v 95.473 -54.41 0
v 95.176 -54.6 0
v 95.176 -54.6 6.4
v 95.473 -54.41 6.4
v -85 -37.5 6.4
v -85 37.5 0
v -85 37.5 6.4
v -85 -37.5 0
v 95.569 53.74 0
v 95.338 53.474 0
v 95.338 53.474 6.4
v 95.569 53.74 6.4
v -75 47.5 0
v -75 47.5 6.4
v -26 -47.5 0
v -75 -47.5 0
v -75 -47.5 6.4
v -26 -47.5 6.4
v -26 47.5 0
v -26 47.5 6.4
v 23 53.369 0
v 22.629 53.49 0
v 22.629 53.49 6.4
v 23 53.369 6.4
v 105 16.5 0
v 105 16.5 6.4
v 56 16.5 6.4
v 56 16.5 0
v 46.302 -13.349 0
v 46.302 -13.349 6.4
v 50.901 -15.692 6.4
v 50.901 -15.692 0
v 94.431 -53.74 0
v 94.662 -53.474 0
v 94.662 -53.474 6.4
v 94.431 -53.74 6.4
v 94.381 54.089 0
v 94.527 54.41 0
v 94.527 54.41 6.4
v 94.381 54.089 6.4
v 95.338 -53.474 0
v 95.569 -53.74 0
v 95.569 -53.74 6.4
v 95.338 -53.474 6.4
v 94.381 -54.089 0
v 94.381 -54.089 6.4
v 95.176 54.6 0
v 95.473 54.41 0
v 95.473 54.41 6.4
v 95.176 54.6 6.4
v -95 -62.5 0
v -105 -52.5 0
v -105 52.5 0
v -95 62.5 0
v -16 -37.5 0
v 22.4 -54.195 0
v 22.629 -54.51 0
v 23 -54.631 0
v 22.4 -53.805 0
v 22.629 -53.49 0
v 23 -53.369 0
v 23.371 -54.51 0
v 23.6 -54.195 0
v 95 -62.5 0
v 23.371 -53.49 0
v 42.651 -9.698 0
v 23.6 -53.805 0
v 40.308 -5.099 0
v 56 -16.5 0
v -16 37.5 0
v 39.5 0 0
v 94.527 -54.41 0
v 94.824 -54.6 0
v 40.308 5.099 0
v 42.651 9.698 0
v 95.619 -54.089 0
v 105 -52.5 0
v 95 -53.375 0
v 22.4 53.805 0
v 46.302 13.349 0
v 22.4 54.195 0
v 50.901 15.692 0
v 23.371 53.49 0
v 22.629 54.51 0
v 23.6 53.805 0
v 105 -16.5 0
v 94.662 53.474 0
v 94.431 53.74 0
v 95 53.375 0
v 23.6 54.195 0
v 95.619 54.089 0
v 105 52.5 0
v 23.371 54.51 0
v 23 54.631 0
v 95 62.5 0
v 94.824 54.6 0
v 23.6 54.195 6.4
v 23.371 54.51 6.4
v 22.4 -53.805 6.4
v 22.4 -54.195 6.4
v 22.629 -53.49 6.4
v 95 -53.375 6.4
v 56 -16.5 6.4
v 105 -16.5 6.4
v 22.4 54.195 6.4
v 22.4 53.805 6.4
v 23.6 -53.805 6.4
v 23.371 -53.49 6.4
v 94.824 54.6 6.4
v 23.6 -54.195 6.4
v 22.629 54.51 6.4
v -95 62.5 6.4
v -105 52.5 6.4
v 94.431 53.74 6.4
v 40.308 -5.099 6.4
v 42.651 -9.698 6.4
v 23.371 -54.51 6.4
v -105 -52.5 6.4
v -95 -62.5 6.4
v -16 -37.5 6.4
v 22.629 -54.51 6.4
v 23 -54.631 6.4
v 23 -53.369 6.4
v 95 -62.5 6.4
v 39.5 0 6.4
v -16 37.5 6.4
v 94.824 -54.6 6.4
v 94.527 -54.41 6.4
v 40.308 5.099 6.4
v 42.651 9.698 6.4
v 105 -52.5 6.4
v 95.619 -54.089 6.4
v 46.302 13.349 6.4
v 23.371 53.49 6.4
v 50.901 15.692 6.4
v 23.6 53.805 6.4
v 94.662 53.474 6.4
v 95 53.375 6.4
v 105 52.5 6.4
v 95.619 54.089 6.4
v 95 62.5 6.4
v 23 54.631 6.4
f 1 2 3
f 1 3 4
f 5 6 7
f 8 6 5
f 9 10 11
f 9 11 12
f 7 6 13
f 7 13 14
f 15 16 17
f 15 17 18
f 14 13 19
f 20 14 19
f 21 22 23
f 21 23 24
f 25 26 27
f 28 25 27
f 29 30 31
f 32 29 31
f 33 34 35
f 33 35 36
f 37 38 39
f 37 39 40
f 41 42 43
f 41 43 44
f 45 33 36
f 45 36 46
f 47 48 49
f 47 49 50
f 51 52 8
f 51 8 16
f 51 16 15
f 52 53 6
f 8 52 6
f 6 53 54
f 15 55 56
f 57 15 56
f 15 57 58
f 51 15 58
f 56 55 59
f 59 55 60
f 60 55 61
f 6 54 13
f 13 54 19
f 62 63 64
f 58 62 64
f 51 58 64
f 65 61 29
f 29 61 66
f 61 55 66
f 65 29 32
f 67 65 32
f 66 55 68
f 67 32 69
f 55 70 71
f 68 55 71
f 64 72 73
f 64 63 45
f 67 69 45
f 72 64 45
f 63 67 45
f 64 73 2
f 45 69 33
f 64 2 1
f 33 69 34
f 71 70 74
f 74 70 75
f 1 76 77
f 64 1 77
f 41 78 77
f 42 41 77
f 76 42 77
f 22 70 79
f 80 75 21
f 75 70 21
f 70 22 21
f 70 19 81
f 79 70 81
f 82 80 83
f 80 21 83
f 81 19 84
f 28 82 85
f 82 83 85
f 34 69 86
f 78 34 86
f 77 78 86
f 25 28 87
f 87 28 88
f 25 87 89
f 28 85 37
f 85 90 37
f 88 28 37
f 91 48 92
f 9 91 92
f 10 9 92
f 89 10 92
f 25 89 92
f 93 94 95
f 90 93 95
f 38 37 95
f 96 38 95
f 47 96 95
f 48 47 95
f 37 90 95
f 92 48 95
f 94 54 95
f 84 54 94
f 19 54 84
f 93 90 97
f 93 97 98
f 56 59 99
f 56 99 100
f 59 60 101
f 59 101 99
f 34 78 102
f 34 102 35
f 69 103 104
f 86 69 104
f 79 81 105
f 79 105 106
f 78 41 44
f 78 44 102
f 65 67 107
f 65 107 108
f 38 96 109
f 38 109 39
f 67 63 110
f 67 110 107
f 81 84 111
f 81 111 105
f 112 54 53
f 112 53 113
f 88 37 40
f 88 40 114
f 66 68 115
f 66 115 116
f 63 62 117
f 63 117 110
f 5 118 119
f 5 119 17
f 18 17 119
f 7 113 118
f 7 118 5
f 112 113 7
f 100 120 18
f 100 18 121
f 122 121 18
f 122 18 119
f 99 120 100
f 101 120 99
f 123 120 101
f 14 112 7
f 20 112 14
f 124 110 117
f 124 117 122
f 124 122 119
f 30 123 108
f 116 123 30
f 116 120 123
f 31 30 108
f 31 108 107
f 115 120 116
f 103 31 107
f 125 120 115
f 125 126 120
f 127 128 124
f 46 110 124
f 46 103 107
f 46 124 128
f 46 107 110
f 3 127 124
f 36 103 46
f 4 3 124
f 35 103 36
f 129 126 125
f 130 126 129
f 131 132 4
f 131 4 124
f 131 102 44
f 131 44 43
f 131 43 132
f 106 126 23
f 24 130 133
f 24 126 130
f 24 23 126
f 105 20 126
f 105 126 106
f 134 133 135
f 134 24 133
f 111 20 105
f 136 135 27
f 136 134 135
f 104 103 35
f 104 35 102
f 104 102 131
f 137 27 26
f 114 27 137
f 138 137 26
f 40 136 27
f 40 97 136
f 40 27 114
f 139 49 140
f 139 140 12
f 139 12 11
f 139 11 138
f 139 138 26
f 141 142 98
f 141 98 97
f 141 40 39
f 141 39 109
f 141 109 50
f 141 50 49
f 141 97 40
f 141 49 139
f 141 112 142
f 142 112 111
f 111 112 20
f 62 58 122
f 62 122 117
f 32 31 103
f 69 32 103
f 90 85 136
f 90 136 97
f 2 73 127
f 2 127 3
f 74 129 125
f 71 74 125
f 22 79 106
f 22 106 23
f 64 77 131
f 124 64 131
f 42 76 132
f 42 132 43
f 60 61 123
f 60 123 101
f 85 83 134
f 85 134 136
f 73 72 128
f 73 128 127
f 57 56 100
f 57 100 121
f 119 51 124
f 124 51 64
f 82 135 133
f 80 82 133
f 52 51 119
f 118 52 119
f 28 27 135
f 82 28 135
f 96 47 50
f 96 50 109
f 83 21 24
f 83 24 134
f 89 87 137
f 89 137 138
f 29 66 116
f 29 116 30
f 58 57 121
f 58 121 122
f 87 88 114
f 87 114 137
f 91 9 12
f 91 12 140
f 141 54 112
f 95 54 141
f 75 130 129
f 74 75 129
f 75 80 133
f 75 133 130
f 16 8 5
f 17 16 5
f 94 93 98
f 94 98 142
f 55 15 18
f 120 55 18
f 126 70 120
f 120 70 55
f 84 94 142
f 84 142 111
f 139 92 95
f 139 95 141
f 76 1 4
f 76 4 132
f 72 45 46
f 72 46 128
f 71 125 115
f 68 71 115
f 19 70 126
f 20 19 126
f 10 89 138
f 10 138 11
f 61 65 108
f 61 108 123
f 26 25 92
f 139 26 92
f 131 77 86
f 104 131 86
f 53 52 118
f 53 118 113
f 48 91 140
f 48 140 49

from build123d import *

# Parameters (mm, degrees)
F0_W     = 210
F0_H     = 125
F1_DEPTH = 6.4
F3_DEPTH = 25
F5_DEPTH = 6.4
F6_SIZE  = 10
F7_W     = 69
F7_H     = 95
F8_DEPTH = 6.401
F9_SIZE  = 10


with BuildPart() as f1:
    # F0 (on Top) → F1 (new body)
    with BuildSketch(Plane.XY):
        Rectangle(F0_W, F0_H)
    extrude(amount=F1_DEPTH)

    # F2 (on face) → F3 (cut)
    with BuildSketch(Plane.XY.offset(6.4)):
        Polygon((105, 16.5), (56, 16.5), (50.90122, 15.692433), (46.301543, 13.34878), (42.65122, 9.698457), (40.307567, 5.09878), (39.5, 0), (40.307567, -5.09878), (42.65122, -9.698457), (46.301543, -13.34878), (50.90122, -15.692433), (56, -16.5), (105, -16.5), align=None)
    extrude(amount=-F3_DEPTH, mode=Mode.SUBTRACT)

    # F4 (on Top) → F5 (cut, through all)
    with BuildSketch(Plane.XY):
        Polygon((94.661921, 53.473939), (95, 53.37467), (95.338079, 53.473939), (95.56882, 53.740228), (95.618965, 54.088994), (95.472593, 54.409504), (95.176176, 54.6), (94.823824, 54.6), (94.527407, 54.409504), (94.381035, 54.088994), (94.43118, 53.740228), align=None)
        Polygon((95.472593, -54.409504), (95.618965, -54.088994), (95.56882, -53.740228), (95.338079, -53.473939), (95, -53.37467), (94.661921, -53.473939), (94.43118, -53.740228), (94.381035, -54.088994), (94.527407, -54.409504), (94.823824, -54.6), (95.176176, -54.6), align=None)
        Polygon((23.37082, 53.48961), (23.6, 53.805048), (23.6, 54.194952), (23.37082, 54.51039), (23, 54.630877), (22.62918, 54.51039), (22.4, 54.194952), (22.4, 53.805048), (22.62918, 53.48961), (23, 53.369123), align=None)
        Polygon((22.62918, -53.48961), (22.4, -53.805048), (22.4, -54.194952), (22.62918, -54.51039), (23, -54.630877), (23.37082, -54.51039), (23.6, -54.194952), (23.6, -53.805048), (23.37082, -53.48961), (23, -53.369123), align=None)
    extrude(amount=F5_DEPTH, mode=Mode.SUBTRACT)

    # F6
    f6_edges = [f1.edges().sort_by_distance(p)[0] for p in [
        (-105, 62.5, 3.2),
        (105, 62.5, 3.2),
        (105, -62.5, 3.2),
        (-105, -62.5, 3.2),
    ]]
    chamfer(f6_edges, length=F6_SIZE)

    # F7 (on face) → F8 (cut, through all)
    with BuildSketch(Plane(origin=(0, 0, 0), x_dir=(1, 0, 0), z_dir=(0, 0, -1))):
        with Locations((-50.5, 0)):
            Rectangle(F7_W, F7_H)
    extrude(amount=-F8_DEPTH, mode=Mode.SUBTRACT)

    # F9
    f9_edges = [f1.edges().sort_by_distance(p)[0] for p in [
        (-85, 47.5, 3.2),
        (-16, 47.5, 3.2),
        (-16, -47.5, 3.2),
        (-85, -47.5, 3.2),
    ]]
    chamfer(f9_edges, length=F9_SIZE)


solid = f1.part
